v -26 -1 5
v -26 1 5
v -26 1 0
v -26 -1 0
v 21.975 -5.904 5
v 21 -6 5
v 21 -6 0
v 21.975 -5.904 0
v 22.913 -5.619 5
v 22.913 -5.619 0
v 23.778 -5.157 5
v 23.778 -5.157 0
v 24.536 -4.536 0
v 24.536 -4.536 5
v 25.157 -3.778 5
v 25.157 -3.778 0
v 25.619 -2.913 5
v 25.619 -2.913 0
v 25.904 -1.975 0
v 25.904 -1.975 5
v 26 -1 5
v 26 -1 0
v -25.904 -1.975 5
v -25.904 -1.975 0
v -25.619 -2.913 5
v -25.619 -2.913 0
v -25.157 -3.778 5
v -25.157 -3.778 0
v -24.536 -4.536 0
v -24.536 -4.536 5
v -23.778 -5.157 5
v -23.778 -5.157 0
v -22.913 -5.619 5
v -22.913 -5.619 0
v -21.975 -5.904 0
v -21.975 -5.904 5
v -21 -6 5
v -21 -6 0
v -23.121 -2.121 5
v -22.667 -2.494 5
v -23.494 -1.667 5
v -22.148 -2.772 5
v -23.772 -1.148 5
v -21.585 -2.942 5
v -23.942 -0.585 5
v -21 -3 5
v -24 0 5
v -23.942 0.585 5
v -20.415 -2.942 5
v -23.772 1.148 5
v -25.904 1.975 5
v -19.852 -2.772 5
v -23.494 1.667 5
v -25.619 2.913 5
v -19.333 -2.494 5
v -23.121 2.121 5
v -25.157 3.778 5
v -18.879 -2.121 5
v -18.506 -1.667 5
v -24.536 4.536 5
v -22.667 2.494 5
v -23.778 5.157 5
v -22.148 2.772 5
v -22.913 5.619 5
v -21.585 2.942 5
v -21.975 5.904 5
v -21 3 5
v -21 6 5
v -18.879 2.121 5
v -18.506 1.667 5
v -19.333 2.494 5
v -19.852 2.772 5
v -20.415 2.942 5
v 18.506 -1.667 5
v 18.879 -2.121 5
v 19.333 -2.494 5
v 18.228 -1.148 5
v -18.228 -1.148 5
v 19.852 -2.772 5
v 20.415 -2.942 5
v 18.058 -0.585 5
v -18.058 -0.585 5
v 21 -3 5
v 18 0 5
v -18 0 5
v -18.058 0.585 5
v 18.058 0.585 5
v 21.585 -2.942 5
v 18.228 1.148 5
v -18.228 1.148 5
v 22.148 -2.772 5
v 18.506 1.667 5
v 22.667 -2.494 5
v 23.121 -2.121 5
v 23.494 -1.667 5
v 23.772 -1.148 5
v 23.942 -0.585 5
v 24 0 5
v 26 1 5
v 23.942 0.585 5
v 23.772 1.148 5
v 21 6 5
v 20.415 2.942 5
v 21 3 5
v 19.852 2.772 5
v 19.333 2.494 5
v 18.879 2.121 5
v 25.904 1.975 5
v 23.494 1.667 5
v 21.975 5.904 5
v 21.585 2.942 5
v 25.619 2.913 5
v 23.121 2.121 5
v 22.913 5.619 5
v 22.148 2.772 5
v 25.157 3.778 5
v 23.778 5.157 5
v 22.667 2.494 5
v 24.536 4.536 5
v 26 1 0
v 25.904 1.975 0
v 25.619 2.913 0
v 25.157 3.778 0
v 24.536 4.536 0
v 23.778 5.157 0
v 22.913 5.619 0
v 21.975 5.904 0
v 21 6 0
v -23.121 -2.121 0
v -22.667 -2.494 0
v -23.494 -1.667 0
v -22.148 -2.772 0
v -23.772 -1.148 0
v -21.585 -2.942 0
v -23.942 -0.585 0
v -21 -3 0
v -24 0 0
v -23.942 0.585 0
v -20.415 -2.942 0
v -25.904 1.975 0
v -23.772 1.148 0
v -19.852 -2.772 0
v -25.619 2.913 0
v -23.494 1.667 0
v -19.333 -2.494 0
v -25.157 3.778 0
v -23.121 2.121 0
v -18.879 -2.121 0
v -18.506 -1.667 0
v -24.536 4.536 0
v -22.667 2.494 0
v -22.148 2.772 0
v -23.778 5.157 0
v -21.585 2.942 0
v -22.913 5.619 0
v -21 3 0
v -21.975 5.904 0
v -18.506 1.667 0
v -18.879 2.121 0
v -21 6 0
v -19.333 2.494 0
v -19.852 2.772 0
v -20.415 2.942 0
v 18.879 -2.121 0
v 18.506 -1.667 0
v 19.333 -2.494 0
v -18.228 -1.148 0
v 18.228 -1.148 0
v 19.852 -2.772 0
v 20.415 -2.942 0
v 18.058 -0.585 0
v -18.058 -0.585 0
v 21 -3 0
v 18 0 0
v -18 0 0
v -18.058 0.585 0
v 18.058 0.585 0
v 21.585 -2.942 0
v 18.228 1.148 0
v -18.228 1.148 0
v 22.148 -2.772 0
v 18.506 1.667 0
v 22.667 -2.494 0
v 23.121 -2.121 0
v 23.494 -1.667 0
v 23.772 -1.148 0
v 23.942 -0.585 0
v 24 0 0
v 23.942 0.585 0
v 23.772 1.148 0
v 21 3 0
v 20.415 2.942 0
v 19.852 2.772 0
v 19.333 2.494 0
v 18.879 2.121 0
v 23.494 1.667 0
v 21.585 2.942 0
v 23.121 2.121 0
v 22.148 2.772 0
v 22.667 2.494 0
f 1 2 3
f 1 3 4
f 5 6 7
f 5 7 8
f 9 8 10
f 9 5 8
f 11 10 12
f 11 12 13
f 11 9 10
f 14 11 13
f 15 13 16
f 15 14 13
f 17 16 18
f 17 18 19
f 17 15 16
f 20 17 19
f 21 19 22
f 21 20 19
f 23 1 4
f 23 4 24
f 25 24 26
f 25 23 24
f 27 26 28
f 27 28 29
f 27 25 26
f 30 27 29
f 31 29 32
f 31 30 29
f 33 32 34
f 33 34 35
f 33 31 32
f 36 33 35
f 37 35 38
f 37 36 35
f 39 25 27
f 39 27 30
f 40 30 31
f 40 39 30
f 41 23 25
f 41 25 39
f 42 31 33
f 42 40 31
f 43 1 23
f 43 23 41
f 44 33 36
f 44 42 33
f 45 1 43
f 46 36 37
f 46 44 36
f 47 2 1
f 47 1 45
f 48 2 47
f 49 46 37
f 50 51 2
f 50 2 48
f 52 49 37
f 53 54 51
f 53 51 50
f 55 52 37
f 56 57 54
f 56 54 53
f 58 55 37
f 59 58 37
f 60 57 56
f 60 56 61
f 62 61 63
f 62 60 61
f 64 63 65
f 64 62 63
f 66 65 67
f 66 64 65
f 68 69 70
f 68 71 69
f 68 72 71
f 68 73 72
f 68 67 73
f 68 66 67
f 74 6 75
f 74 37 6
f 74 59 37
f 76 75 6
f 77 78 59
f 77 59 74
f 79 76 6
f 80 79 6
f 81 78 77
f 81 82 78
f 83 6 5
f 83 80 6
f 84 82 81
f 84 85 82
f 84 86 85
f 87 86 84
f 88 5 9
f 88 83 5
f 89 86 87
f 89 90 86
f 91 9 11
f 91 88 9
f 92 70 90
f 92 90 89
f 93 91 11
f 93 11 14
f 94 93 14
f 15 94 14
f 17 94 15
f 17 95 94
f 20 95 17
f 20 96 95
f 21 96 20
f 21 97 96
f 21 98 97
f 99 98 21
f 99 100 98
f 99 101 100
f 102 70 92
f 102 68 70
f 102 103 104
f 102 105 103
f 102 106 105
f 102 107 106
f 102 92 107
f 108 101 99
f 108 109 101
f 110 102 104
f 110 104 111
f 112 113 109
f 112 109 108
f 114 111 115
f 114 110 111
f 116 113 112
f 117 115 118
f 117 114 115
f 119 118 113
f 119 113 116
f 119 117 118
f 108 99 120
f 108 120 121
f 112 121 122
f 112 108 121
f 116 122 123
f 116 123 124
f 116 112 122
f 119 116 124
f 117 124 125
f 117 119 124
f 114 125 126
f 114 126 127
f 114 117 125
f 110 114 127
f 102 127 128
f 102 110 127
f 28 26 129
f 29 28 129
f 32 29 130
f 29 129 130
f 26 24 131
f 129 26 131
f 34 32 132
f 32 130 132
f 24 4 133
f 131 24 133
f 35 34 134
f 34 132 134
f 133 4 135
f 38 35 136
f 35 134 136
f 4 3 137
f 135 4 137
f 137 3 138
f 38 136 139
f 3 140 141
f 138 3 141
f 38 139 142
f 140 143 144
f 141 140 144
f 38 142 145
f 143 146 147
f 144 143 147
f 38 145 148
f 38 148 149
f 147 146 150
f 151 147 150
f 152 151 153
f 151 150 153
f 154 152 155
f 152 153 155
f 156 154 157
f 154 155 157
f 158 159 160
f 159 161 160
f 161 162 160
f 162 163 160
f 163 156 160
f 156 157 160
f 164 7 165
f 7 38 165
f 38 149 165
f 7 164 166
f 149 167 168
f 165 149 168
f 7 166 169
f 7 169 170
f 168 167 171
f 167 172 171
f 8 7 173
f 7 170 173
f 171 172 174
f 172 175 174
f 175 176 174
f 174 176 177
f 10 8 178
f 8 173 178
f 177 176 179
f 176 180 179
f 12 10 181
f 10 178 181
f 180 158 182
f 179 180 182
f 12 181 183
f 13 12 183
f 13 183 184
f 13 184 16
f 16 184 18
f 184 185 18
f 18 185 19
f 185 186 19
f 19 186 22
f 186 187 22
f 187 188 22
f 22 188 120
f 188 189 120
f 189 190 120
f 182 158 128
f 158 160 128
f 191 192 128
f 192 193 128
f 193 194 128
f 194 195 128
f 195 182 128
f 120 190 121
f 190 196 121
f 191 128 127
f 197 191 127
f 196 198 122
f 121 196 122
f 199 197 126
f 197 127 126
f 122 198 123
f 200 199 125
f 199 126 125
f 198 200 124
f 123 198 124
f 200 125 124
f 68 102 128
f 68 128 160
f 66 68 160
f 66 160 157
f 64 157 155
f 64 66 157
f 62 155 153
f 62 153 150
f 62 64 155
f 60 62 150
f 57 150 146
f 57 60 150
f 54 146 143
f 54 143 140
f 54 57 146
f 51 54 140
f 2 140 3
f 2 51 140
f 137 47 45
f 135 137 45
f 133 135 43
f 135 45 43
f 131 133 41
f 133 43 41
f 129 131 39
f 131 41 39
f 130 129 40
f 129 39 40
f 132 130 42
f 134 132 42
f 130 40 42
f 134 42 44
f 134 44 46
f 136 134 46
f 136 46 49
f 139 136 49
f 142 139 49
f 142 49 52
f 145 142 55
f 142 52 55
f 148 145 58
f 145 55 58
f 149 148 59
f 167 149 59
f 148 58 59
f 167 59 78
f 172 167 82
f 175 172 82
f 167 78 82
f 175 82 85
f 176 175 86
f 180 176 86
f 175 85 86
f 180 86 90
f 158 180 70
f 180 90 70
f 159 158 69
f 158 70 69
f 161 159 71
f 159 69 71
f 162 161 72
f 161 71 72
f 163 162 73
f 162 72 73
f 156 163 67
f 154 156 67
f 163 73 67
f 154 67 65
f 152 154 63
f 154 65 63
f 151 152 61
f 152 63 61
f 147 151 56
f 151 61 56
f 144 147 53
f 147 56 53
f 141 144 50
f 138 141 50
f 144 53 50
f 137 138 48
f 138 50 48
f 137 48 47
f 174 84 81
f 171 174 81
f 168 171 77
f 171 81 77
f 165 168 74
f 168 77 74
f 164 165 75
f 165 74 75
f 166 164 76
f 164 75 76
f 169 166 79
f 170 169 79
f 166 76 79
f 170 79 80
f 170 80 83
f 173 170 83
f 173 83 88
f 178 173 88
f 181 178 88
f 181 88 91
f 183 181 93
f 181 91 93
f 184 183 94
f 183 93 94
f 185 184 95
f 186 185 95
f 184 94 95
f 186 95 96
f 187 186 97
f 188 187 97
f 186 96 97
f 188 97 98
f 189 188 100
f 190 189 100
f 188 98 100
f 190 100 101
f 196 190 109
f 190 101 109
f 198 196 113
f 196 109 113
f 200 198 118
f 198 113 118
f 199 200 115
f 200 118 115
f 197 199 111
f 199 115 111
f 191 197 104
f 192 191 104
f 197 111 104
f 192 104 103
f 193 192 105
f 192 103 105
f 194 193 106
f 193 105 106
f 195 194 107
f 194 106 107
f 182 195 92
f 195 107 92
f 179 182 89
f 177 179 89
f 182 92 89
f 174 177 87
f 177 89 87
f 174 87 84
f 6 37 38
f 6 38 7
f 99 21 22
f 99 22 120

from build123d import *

# Parameters (mm, degrees)
ESQUISSE1_R        = 3
BOSS_EXTRU_1_DEPTH = 5


with BuildPart() as part:
    # Esquisse1 → Boss.-Extru.1 (new body)
    with BuildSketch(Plane.XY.offset(5)):
        with BuildLine():
            Line((-26, 1), (-26, -1))
            ThreePointArc((-26, -1), (-24.535533906, -4.535533906), (-21, -6))
            Line((-21, -6), (21, -6))
            ThreePointArc((21, -6), (24.535533906, -4.535533906), (26, -1))
            Line((26, -1), (26, 1))
            ThreePointArc((26, 1), (24.535533906, 4.535533906), (21, 6))
            Line((21, 6), (-21, 6))
            ThreePointArc((-21, 6), (-24.535533906, 4.535533906), (-26, 1))
        make_face()
        with Locations(Location((21, 0, 0), (0, 0, 180))):  # turned: the seam where the file's is
            Circle(ESQUISSE1_R, mode=Mode.SUBTRACT)
        with Locations(Location((-21, 0, 0), (0, 0, 180))):  # turned: the seam where the file's is
            Circle(ESQUISSE1_R, mode=Mode.SUBTRACT)
    extrude(amount=-BOSS_EXTRU_1_DEPTH)


solid = part.part
